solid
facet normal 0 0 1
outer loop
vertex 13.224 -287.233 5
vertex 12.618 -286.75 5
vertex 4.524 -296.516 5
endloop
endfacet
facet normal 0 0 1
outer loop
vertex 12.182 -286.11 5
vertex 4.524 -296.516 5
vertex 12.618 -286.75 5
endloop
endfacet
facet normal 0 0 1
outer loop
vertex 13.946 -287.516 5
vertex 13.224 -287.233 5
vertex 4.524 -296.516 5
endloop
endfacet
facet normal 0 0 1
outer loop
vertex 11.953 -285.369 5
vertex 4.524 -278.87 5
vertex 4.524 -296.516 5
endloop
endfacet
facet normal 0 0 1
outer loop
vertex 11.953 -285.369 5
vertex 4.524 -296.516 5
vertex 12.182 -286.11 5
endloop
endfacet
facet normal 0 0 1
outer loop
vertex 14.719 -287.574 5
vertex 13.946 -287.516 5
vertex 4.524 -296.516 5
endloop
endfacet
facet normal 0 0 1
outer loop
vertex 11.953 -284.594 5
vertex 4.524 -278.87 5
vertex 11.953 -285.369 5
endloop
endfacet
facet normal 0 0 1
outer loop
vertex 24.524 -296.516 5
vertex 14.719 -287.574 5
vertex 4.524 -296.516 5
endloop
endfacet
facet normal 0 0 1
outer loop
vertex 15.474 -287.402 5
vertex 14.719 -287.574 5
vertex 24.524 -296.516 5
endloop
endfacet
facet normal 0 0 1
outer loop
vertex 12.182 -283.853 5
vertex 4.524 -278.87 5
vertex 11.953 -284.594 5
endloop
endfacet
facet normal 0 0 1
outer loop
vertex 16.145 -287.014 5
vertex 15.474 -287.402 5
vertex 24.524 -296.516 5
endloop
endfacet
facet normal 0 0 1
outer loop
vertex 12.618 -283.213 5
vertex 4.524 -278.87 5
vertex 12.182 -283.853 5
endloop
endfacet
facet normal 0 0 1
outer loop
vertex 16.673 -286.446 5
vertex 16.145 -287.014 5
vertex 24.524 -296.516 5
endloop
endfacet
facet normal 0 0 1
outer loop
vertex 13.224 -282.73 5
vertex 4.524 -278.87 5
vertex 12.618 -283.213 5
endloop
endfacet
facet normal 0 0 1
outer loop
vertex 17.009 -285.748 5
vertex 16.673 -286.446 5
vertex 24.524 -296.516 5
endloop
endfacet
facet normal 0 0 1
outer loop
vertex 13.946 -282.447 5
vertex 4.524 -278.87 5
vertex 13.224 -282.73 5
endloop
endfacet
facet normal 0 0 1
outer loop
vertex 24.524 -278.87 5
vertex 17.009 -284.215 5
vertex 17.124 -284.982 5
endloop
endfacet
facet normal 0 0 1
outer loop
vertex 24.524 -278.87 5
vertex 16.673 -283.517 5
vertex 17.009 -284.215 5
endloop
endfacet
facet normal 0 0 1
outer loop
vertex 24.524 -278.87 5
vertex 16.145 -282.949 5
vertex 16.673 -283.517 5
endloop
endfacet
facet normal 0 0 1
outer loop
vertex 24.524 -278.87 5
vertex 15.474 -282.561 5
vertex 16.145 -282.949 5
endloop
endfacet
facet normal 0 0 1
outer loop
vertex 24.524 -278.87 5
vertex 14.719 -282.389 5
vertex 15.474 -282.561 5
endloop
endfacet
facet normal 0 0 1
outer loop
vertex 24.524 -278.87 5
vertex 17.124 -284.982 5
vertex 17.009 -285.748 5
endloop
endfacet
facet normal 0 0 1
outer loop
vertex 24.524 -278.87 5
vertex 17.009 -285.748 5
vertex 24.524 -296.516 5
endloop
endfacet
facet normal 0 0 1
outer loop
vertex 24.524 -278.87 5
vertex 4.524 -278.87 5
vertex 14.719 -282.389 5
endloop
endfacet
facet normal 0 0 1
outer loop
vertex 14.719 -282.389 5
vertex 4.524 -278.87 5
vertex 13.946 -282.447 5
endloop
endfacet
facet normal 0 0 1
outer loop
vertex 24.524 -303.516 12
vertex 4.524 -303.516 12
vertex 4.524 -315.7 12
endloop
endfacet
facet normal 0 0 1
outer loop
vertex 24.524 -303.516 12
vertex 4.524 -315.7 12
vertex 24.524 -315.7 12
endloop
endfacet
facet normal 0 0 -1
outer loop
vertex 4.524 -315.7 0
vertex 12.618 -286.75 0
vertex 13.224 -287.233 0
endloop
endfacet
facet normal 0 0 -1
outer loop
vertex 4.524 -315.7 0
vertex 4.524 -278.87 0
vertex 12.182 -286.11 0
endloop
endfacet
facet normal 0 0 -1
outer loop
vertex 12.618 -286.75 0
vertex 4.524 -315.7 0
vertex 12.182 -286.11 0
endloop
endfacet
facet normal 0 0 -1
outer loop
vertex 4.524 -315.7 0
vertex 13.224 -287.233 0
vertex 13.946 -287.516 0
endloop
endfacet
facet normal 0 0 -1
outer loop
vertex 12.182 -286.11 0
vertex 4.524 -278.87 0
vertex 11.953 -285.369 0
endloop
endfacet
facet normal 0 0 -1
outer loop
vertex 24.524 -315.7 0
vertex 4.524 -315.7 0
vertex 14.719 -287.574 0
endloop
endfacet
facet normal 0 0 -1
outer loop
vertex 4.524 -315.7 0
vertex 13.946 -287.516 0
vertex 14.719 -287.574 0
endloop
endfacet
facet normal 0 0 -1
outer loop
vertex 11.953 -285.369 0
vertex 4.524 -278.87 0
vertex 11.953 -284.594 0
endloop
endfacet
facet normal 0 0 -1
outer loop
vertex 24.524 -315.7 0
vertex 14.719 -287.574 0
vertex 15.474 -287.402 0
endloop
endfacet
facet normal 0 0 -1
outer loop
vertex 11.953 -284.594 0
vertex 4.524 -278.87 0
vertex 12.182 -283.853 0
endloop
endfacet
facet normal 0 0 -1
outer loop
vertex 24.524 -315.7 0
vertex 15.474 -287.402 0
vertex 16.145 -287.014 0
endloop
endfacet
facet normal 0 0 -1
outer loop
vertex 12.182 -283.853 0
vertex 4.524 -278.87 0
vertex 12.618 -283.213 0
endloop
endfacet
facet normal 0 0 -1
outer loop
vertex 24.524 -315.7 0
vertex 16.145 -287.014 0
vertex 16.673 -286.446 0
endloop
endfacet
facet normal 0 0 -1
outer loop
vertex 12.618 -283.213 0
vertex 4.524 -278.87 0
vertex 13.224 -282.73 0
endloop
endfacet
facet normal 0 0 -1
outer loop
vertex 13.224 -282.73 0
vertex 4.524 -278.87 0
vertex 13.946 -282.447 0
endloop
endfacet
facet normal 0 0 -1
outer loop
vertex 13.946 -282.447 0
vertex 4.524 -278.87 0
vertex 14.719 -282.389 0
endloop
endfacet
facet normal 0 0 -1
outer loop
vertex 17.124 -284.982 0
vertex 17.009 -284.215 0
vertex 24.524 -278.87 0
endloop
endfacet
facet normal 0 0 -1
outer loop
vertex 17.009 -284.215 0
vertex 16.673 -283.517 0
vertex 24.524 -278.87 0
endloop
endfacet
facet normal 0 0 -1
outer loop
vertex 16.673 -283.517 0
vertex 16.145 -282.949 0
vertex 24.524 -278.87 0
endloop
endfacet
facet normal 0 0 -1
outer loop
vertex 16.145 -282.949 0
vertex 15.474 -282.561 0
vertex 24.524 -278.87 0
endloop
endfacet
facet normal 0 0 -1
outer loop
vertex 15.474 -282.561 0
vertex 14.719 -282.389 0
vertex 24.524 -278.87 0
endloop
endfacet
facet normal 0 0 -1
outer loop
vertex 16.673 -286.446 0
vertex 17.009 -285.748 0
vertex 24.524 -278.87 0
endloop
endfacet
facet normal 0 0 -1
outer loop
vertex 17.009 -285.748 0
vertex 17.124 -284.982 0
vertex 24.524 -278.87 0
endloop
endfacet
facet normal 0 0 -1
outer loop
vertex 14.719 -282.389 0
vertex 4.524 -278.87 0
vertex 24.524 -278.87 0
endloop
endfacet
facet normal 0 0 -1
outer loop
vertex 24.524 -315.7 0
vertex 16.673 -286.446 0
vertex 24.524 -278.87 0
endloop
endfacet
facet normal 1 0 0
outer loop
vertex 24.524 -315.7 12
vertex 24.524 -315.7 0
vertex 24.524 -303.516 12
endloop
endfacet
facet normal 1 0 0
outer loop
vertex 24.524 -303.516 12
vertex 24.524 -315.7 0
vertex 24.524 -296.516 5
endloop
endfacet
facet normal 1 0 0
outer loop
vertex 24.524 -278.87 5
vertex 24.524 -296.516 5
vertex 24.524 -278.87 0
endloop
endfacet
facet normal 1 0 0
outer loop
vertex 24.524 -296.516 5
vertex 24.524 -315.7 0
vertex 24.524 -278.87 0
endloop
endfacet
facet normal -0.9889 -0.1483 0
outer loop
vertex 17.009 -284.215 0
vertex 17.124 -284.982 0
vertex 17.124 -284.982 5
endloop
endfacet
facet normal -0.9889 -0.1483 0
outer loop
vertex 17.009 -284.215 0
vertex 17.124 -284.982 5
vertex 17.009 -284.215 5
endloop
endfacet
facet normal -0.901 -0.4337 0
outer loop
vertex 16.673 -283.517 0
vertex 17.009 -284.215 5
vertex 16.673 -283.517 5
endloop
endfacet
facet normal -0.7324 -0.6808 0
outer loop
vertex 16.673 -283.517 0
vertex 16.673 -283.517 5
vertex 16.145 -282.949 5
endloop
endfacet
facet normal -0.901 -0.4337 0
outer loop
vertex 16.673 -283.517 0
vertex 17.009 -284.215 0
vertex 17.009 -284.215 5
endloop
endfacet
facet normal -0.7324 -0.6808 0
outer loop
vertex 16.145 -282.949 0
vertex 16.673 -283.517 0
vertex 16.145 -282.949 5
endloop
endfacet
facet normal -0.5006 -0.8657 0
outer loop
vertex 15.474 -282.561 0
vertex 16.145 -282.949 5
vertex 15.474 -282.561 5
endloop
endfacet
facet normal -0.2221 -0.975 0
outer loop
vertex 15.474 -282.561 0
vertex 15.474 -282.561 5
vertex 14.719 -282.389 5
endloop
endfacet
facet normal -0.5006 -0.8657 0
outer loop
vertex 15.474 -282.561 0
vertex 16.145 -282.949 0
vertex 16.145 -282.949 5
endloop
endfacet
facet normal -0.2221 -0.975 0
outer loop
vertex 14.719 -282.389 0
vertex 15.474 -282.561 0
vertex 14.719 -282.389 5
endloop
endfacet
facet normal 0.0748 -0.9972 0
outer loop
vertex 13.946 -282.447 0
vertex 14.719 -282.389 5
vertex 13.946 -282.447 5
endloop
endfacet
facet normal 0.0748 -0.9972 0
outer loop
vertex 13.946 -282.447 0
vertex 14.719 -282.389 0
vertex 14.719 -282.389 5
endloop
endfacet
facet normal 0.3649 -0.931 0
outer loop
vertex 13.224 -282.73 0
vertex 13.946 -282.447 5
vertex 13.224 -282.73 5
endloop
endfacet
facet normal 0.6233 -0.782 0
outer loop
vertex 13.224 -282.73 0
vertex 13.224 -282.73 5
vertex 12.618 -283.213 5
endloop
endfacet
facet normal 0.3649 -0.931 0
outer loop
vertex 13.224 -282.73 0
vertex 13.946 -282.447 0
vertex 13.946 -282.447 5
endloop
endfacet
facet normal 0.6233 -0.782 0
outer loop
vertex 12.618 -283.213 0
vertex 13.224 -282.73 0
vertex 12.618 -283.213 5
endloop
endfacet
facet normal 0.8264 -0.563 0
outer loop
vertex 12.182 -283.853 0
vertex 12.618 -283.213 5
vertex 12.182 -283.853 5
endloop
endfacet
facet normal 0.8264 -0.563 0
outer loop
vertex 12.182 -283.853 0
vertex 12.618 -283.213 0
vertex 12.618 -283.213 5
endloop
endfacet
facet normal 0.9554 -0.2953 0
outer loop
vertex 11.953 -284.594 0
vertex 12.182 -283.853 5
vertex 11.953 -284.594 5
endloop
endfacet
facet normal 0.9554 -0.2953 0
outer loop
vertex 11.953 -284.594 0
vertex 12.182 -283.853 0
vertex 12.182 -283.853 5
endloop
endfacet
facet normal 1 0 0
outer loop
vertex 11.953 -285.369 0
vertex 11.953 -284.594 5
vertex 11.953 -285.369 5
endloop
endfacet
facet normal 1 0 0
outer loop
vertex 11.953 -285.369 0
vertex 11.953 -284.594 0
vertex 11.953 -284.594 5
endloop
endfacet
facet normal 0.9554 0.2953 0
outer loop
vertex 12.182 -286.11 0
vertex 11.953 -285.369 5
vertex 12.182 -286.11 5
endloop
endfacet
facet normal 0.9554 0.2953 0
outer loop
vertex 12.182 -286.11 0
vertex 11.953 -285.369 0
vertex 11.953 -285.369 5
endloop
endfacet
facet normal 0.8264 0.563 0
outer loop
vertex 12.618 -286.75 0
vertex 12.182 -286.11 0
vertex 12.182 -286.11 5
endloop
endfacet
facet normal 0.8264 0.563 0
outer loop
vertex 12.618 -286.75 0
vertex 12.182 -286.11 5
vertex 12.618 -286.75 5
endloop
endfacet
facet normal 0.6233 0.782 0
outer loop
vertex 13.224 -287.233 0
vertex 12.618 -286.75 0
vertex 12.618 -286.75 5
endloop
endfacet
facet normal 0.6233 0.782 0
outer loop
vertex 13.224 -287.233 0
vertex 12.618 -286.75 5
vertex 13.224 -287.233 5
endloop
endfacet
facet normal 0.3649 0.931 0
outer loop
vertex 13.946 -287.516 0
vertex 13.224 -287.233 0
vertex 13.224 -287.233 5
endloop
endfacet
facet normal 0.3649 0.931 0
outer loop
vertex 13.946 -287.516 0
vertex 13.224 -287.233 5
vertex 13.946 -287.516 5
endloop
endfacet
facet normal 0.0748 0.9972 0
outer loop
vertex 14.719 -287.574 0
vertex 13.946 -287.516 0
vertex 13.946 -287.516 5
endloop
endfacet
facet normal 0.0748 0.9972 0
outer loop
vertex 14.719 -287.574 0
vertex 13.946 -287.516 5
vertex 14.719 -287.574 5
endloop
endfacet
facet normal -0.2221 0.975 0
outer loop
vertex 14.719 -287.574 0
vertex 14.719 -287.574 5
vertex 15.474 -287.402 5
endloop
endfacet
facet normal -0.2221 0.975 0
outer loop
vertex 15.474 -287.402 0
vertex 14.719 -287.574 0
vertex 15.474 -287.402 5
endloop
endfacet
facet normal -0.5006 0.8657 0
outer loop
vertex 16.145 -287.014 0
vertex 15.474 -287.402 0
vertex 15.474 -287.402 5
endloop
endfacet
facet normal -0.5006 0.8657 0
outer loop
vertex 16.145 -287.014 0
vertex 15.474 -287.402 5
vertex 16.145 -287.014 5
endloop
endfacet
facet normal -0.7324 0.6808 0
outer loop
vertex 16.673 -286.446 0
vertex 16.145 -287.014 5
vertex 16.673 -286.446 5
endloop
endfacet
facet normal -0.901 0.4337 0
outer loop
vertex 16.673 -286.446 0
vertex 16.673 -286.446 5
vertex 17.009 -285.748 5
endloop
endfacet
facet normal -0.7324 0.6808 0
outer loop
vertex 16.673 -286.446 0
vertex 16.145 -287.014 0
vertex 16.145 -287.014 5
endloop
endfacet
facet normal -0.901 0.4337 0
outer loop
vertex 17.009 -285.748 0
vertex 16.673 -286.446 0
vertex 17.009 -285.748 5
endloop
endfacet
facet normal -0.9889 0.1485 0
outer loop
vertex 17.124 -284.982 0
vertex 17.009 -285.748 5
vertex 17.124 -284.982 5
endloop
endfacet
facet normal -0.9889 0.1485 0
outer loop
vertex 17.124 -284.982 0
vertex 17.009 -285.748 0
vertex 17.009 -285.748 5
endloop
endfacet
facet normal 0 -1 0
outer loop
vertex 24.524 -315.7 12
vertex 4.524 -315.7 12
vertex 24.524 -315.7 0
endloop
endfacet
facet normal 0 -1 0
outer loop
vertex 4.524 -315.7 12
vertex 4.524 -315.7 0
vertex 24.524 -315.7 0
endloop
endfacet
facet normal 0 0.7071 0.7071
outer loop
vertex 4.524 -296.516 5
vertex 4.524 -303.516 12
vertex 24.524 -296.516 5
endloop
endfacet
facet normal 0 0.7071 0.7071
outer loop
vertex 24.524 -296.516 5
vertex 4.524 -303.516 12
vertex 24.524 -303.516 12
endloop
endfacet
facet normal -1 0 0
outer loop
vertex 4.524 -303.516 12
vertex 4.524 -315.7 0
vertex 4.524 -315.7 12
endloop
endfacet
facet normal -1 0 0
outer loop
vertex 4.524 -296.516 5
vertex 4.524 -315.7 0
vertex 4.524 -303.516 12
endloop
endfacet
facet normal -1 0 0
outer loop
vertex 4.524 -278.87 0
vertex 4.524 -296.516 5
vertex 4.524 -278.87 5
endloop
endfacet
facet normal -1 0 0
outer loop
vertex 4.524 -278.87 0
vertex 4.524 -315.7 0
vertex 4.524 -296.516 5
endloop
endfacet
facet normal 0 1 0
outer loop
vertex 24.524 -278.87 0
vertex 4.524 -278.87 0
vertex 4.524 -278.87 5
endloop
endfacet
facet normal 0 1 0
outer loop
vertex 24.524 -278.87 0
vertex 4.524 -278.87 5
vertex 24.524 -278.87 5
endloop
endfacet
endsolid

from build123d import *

# Parameters (mm, degrees)
SKICA1_W                = 20
SKICA1_H                = 36.830083089
SKICA1_R                = 2.6
P_IDAT_VYSUNUT_M1_DEPTH = 5
SKICA2_W                = 20
SKICA2_H                = 19.184386705
P_IDAT_VYSUNUT_M2_DEPTH = 7
ZKOSEN_1_SIZE           = 7


with BuildPart() as part:
    # Skica1 → Přidat vysunutím1 (new body)
    with BuildSketch(Plane.XY):
        with Locations((14.524287798, -297.284958456)):
            Rectangle(SKICA1_W, SKICA1_H)
        with Locations((14.524287798, -284.981509323)):
            Circle(SKICA1_R, mode=Mode.SUBTRACT)
    extrude(amount=P_IDAT_VYSUNUT_M1_DEPTH)

    # Skica2 → Přidat vysunutím2 (add)
    with BuildSketch(Plane.XY.offset(5)):
        with Locations((14.524287798, -306.107806648)):
            Rectangle(SKICA2_W, SKICA2_H)
    extrude(amount=P_IDAT_VYSUNUT_M2_DEPTH)

    # Zkosení1
    zkosen_1_edges = [part.edges().sort_by_distance(p)[0] for p in [
        (14.524287798, -296.515613295, 12),
    ]]
    chamfer(zkosen_1_edges, length=ZKOSEN_1_SIZE - 0.0001)  # a hair under: the kernel refuses the full size


solid = part.part
